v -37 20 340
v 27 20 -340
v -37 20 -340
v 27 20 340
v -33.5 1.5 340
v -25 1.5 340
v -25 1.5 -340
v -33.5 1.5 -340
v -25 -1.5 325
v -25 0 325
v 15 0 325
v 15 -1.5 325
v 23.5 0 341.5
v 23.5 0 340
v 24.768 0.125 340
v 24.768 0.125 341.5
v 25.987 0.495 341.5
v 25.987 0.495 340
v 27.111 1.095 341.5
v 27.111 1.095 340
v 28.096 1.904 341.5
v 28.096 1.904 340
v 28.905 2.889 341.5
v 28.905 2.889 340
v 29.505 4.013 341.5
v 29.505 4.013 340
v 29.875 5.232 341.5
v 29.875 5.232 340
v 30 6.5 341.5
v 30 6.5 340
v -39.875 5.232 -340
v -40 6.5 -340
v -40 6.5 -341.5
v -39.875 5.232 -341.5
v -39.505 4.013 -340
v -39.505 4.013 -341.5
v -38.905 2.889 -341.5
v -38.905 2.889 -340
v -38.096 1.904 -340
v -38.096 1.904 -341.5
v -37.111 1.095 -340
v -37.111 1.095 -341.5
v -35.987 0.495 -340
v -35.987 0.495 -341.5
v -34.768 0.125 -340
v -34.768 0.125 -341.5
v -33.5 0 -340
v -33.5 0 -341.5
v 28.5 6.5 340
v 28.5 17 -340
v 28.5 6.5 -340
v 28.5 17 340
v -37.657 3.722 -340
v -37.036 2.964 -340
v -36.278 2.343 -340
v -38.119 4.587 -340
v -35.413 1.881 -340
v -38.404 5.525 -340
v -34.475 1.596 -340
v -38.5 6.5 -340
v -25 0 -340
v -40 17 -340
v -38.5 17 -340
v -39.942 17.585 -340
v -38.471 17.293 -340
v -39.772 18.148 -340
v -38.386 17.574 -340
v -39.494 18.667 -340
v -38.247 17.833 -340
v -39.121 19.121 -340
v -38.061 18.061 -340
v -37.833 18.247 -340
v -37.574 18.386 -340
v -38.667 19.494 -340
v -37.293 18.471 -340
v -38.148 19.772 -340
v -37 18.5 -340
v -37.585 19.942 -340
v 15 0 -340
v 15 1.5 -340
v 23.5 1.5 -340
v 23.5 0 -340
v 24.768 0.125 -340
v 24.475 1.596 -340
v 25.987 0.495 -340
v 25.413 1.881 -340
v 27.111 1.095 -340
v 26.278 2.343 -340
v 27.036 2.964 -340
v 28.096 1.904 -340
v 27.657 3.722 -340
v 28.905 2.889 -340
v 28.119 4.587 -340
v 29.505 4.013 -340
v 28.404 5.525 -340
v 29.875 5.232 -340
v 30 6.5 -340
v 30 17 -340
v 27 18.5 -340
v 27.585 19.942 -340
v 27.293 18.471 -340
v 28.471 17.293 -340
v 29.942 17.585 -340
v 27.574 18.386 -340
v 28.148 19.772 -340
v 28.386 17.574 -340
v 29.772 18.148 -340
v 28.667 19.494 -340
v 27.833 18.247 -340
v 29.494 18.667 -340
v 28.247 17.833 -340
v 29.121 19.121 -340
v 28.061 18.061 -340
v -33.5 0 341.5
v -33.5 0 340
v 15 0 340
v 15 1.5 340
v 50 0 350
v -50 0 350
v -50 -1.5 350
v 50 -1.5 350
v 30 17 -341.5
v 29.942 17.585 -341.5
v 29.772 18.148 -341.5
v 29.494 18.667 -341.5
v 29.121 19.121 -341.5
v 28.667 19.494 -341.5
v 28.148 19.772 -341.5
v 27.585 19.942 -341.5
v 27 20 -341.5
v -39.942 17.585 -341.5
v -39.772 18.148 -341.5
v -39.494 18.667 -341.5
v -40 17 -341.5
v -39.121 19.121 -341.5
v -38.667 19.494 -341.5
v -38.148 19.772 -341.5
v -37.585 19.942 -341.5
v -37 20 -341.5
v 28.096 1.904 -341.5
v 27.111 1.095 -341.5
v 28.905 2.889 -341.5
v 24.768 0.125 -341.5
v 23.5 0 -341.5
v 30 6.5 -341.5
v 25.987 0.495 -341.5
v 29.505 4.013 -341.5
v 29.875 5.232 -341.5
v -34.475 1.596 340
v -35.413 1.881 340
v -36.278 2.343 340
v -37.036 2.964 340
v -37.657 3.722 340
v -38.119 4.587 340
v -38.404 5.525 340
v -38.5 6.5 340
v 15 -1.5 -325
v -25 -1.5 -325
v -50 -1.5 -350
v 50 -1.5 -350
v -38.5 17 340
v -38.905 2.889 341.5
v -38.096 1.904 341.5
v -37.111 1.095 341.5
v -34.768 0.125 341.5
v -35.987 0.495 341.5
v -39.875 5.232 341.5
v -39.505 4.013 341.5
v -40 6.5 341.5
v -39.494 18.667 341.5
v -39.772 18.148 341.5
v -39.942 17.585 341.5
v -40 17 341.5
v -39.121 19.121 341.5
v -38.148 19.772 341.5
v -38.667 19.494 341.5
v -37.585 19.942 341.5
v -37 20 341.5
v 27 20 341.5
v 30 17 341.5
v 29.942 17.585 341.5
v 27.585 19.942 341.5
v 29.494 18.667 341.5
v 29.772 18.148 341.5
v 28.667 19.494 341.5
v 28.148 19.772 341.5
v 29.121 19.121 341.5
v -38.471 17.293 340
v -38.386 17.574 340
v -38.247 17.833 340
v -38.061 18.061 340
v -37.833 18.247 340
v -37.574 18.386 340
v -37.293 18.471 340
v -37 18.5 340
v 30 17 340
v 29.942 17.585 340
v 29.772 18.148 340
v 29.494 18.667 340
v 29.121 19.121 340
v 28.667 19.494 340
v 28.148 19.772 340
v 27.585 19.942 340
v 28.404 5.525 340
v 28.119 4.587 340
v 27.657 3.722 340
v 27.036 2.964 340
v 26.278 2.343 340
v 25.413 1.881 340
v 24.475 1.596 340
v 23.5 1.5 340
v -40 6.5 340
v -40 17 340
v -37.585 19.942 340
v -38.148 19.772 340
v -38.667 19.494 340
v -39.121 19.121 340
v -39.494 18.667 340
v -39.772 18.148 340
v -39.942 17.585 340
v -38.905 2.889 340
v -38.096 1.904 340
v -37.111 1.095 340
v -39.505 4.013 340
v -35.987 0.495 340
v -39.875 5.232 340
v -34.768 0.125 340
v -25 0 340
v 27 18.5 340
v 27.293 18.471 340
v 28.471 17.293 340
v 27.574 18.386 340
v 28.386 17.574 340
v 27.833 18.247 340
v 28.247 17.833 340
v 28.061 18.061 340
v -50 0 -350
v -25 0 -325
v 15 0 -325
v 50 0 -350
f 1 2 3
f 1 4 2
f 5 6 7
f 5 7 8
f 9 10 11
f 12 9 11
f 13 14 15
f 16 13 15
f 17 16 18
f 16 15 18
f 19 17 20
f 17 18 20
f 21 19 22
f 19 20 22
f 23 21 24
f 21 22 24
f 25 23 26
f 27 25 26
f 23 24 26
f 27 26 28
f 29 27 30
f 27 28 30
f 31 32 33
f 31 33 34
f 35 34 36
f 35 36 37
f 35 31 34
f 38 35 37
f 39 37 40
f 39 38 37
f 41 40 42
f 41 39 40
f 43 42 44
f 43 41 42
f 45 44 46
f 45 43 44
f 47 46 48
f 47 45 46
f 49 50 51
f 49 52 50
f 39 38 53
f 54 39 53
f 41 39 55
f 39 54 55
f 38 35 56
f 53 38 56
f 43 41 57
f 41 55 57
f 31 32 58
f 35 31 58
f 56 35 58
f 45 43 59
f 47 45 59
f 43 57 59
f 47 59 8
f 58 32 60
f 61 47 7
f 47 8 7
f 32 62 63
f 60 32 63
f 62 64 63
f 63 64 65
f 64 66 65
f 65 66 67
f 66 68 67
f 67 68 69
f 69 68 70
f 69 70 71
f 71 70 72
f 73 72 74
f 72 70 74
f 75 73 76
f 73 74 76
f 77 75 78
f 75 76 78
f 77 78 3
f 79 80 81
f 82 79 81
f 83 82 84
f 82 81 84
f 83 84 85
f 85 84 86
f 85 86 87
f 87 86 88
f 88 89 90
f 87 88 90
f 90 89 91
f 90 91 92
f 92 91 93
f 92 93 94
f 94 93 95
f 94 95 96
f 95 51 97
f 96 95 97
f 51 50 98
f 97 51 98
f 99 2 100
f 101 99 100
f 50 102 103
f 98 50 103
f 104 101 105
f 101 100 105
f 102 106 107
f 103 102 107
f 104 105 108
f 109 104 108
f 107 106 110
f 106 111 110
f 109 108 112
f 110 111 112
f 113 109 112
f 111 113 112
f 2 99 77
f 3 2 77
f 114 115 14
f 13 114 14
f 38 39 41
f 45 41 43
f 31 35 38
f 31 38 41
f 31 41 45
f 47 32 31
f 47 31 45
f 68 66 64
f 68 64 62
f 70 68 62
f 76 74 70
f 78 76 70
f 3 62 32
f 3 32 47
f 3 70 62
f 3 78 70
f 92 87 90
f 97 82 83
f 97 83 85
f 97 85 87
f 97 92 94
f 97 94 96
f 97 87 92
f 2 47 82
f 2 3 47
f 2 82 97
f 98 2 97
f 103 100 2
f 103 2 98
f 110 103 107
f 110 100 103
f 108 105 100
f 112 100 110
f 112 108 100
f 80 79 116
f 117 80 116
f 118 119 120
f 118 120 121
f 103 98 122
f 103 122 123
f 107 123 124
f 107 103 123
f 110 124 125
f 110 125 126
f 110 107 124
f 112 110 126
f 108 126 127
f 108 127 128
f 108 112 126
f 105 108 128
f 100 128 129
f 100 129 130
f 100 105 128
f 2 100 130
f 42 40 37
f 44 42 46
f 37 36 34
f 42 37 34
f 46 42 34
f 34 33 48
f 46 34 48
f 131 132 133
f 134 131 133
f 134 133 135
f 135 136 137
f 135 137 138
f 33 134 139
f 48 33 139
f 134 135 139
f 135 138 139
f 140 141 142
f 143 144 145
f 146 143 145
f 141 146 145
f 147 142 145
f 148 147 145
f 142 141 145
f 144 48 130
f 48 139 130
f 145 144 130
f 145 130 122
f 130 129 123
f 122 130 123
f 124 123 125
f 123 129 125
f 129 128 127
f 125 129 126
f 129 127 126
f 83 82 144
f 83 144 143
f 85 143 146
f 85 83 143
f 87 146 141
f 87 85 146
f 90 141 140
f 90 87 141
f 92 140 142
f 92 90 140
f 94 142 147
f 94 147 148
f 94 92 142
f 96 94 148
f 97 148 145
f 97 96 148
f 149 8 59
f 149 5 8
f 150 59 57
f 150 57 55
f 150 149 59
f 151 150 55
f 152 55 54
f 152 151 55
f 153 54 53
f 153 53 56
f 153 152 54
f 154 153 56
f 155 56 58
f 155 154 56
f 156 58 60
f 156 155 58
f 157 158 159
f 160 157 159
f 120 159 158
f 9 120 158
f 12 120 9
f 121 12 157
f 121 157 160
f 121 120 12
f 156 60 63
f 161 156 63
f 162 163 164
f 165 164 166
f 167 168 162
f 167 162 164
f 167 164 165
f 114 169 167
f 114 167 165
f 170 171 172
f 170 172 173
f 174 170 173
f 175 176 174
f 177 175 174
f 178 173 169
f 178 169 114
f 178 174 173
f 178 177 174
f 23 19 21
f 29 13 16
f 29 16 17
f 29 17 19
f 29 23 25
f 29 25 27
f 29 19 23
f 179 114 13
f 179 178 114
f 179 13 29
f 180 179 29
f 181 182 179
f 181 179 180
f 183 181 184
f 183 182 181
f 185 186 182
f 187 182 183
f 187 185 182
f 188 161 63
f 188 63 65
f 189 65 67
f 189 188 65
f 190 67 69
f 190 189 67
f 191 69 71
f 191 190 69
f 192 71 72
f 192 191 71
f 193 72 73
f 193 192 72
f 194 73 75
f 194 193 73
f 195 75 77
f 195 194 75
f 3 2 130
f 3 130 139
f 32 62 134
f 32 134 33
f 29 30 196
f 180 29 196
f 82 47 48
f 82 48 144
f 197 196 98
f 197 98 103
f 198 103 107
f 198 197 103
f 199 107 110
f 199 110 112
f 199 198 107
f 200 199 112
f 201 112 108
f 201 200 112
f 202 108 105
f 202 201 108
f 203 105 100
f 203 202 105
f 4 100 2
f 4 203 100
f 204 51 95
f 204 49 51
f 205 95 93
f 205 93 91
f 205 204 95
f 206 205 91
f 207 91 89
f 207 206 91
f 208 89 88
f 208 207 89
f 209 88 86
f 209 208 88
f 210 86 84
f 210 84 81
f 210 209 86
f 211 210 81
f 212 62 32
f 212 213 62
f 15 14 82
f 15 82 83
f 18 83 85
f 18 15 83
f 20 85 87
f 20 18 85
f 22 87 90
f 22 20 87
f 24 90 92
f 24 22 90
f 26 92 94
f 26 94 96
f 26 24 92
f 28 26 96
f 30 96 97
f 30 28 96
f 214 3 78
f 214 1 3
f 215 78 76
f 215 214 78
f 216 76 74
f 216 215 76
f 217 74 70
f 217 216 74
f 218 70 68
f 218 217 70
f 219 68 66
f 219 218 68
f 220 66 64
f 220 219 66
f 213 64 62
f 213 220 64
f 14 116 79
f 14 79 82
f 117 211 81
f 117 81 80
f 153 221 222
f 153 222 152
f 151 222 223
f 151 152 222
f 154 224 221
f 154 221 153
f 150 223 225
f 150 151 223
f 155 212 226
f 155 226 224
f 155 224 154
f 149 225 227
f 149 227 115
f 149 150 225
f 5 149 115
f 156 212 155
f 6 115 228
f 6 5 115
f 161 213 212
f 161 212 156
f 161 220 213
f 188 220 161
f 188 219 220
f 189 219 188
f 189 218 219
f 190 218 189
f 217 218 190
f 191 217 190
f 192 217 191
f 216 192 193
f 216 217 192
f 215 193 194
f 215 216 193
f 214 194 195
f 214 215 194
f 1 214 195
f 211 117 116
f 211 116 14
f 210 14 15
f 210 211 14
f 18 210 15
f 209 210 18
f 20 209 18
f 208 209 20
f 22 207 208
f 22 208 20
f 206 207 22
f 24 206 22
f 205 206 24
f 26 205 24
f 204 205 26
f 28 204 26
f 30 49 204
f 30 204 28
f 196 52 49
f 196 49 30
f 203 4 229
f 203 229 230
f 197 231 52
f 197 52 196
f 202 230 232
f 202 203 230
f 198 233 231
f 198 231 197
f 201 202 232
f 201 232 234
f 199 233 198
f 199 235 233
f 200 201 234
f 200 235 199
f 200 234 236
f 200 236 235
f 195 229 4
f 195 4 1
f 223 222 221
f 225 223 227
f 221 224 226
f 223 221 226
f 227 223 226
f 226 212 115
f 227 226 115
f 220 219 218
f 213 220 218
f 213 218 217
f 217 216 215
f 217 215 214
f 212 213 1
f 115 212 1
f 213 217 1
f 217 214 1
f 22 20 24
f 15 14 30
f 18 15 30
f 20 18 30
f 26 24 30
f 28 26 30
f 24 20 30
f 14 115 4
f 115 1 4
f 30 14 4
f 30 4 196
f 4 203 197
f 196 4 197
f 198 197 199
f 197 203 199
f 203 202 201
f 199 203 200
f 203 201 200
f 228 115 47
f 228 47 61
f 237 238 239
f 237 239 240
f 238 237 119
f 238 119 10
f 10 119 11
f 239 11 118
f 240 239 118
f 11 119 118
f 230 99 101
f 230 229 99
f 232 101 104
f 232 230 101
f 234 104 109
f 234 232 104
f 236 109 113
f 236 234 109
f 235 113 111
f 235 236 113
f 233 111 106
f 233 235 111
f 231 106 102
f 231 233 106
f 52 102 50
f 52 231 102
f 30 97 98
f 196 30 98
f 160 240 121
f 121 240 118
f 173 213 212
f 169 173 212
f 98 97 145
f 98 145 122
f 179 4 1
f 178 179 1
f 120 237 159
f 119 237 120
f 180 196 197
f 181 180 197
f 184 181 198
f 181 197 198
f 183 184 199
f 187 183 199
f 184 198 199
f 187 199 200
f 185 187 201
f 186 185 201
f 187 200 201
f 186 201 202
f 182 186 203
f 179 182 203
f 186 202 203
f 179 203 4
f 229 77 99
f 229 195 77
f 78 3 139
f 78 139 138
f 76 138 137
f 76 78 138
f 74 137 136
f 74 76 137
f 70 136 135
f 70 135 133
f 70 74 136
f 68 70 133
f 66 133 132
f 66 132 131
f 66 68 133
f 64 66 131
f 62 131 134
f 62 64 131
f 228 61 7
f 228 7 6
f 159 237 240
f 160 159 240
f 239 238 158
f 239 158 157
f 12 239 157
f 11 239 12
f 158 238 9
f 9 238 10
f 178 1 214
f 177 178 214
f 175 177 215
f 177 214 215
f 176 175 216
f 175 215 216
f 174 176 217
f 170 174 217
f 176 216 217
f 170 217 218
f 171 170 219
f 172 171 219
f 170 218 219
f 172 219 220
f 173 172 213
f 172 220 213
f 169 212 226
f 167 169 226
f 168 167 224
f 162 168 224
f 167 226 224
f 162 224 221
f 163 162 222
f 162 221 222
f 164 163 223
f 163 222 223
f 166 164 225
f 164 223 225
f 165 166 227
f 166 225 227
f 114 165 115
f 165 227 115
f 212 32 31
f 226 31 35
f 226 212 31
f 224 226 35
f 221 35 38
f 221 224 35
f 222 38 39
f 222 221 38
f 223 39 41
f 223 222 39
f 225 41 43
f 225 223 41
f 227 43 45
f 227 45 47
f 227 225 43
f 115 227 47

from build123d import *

# Parameters (mm, degrees)
F0_W     = 100
F0_H     = 700
F0_W_2   = 40
F0_H_2   = 650
F1_DEPTH = 1.5
F3_DEPTH = 340
F4_W     = 40
F4_H     = 680
F5_DEPTH = 1.5
F7_DEPTH = 1.5


with BuildPart() as f1:
    # F0 (on Front) → F1 (new body)
    with BuildSketch(Plane.XZ):
        Rectangle(F0_W, F0_H)
        with Locations((-5, 0)):
            Rectangle(F0_W_2, F0_H_2, mode=Mode.SUBTRACT)
    extrude(amount=F1_DEPTH)


with BuildPart() as f3:
    # F2 (on Top) → F3 (new body, symmetric)
    with BuildSketch(Plane.XY):
        with BuildLine():
            ThreePointArc((-40, 6.5), (-38.096194, 1.903806), (-33.5, 0))
            Line((-33.5, 0), (23.5, 0))
            ThreePointArc((23.5, 0), (28.096194, 1.903806), (30, 6.5))
            Line((30, 6.5), (30, 17))
            ThreePointArc((30, 17), (29.12132, 19.12132), (27, 20))
            Line((27, 20), (-37, 20))
            ThreePointArc((-37, 20), (-39.12132, 19.12132), (-40, 17))
            Line((-40, 17), (-40, 6.5))
        make_face()
        with BuildLine():
            ThreePointArc((-38.5, 17), (-38.06066, 18.06066), (-37, 18.5))
            Line((-37, 18.5), (27, 18.5))
            ThreePointArc((27, 18.5), (28.06066, 18.06066), (28.5, 17))
            Line((28.5, 17), (28.5, 6.5))
            ThreePointArc((28.5, 6.5), (27.035534, 2.964466), (23.5, 1.5))
            Line((23.5, 1.5), (-33.5, 1.5))
            ThreePointArc((-33.5, 1.5), (-37.035534, 2.964466), (-38.5, 6.5))
            Line((-38.5, 6.5), (-38.5, 17))
        make_face(mode=Mode.SUBTRACT)
    extrude(amount=F3_DEPTH, both=True)

    # F4 (on face) → F5 (cut, through all)
    with BuildSketch(Plane.XZ):
        with Locations((-5, 0)):
            Rectangle(F4_W, F4_H)
    extrude(amount=-F5_DEPTH, mode=Mode.SUBTRACT)


with BuildPart() as f7:
    # F6 (on face) → F7 (new body)
    with BuildSketch(Plane.XY.offset(340)):
        with BuildLine():
            Line((27, 20), (-37, 20))
            ThreePointArc((-37, 20), (-39.12132, 19.12132), (-40, 17))
            Line((-40, 17), (-40, 6.5))
            ThreePointArc((-40, 6.5), (-38.096194, 1.903806), (-33.5, 0))
            Line((-33.5, 0), (23.5, 0))
            ThreePointArc((23.5, 0), (28.096194, 1.903806), (30, 6.5))
            Line((30, 6.5), (30, 17))
            ThreePointArc((30, 17), (29.12132, 19.12132), (27, 20))
        make_face()
    extrude(amount=F7_DEPTH)


with BuildPart() as f8_1:
    # F8: instance of F7
    add(f7.part.mirror(Plane.XY))


solid = Compound([f1.part, f3.part, f7.part, f8_1.part])
